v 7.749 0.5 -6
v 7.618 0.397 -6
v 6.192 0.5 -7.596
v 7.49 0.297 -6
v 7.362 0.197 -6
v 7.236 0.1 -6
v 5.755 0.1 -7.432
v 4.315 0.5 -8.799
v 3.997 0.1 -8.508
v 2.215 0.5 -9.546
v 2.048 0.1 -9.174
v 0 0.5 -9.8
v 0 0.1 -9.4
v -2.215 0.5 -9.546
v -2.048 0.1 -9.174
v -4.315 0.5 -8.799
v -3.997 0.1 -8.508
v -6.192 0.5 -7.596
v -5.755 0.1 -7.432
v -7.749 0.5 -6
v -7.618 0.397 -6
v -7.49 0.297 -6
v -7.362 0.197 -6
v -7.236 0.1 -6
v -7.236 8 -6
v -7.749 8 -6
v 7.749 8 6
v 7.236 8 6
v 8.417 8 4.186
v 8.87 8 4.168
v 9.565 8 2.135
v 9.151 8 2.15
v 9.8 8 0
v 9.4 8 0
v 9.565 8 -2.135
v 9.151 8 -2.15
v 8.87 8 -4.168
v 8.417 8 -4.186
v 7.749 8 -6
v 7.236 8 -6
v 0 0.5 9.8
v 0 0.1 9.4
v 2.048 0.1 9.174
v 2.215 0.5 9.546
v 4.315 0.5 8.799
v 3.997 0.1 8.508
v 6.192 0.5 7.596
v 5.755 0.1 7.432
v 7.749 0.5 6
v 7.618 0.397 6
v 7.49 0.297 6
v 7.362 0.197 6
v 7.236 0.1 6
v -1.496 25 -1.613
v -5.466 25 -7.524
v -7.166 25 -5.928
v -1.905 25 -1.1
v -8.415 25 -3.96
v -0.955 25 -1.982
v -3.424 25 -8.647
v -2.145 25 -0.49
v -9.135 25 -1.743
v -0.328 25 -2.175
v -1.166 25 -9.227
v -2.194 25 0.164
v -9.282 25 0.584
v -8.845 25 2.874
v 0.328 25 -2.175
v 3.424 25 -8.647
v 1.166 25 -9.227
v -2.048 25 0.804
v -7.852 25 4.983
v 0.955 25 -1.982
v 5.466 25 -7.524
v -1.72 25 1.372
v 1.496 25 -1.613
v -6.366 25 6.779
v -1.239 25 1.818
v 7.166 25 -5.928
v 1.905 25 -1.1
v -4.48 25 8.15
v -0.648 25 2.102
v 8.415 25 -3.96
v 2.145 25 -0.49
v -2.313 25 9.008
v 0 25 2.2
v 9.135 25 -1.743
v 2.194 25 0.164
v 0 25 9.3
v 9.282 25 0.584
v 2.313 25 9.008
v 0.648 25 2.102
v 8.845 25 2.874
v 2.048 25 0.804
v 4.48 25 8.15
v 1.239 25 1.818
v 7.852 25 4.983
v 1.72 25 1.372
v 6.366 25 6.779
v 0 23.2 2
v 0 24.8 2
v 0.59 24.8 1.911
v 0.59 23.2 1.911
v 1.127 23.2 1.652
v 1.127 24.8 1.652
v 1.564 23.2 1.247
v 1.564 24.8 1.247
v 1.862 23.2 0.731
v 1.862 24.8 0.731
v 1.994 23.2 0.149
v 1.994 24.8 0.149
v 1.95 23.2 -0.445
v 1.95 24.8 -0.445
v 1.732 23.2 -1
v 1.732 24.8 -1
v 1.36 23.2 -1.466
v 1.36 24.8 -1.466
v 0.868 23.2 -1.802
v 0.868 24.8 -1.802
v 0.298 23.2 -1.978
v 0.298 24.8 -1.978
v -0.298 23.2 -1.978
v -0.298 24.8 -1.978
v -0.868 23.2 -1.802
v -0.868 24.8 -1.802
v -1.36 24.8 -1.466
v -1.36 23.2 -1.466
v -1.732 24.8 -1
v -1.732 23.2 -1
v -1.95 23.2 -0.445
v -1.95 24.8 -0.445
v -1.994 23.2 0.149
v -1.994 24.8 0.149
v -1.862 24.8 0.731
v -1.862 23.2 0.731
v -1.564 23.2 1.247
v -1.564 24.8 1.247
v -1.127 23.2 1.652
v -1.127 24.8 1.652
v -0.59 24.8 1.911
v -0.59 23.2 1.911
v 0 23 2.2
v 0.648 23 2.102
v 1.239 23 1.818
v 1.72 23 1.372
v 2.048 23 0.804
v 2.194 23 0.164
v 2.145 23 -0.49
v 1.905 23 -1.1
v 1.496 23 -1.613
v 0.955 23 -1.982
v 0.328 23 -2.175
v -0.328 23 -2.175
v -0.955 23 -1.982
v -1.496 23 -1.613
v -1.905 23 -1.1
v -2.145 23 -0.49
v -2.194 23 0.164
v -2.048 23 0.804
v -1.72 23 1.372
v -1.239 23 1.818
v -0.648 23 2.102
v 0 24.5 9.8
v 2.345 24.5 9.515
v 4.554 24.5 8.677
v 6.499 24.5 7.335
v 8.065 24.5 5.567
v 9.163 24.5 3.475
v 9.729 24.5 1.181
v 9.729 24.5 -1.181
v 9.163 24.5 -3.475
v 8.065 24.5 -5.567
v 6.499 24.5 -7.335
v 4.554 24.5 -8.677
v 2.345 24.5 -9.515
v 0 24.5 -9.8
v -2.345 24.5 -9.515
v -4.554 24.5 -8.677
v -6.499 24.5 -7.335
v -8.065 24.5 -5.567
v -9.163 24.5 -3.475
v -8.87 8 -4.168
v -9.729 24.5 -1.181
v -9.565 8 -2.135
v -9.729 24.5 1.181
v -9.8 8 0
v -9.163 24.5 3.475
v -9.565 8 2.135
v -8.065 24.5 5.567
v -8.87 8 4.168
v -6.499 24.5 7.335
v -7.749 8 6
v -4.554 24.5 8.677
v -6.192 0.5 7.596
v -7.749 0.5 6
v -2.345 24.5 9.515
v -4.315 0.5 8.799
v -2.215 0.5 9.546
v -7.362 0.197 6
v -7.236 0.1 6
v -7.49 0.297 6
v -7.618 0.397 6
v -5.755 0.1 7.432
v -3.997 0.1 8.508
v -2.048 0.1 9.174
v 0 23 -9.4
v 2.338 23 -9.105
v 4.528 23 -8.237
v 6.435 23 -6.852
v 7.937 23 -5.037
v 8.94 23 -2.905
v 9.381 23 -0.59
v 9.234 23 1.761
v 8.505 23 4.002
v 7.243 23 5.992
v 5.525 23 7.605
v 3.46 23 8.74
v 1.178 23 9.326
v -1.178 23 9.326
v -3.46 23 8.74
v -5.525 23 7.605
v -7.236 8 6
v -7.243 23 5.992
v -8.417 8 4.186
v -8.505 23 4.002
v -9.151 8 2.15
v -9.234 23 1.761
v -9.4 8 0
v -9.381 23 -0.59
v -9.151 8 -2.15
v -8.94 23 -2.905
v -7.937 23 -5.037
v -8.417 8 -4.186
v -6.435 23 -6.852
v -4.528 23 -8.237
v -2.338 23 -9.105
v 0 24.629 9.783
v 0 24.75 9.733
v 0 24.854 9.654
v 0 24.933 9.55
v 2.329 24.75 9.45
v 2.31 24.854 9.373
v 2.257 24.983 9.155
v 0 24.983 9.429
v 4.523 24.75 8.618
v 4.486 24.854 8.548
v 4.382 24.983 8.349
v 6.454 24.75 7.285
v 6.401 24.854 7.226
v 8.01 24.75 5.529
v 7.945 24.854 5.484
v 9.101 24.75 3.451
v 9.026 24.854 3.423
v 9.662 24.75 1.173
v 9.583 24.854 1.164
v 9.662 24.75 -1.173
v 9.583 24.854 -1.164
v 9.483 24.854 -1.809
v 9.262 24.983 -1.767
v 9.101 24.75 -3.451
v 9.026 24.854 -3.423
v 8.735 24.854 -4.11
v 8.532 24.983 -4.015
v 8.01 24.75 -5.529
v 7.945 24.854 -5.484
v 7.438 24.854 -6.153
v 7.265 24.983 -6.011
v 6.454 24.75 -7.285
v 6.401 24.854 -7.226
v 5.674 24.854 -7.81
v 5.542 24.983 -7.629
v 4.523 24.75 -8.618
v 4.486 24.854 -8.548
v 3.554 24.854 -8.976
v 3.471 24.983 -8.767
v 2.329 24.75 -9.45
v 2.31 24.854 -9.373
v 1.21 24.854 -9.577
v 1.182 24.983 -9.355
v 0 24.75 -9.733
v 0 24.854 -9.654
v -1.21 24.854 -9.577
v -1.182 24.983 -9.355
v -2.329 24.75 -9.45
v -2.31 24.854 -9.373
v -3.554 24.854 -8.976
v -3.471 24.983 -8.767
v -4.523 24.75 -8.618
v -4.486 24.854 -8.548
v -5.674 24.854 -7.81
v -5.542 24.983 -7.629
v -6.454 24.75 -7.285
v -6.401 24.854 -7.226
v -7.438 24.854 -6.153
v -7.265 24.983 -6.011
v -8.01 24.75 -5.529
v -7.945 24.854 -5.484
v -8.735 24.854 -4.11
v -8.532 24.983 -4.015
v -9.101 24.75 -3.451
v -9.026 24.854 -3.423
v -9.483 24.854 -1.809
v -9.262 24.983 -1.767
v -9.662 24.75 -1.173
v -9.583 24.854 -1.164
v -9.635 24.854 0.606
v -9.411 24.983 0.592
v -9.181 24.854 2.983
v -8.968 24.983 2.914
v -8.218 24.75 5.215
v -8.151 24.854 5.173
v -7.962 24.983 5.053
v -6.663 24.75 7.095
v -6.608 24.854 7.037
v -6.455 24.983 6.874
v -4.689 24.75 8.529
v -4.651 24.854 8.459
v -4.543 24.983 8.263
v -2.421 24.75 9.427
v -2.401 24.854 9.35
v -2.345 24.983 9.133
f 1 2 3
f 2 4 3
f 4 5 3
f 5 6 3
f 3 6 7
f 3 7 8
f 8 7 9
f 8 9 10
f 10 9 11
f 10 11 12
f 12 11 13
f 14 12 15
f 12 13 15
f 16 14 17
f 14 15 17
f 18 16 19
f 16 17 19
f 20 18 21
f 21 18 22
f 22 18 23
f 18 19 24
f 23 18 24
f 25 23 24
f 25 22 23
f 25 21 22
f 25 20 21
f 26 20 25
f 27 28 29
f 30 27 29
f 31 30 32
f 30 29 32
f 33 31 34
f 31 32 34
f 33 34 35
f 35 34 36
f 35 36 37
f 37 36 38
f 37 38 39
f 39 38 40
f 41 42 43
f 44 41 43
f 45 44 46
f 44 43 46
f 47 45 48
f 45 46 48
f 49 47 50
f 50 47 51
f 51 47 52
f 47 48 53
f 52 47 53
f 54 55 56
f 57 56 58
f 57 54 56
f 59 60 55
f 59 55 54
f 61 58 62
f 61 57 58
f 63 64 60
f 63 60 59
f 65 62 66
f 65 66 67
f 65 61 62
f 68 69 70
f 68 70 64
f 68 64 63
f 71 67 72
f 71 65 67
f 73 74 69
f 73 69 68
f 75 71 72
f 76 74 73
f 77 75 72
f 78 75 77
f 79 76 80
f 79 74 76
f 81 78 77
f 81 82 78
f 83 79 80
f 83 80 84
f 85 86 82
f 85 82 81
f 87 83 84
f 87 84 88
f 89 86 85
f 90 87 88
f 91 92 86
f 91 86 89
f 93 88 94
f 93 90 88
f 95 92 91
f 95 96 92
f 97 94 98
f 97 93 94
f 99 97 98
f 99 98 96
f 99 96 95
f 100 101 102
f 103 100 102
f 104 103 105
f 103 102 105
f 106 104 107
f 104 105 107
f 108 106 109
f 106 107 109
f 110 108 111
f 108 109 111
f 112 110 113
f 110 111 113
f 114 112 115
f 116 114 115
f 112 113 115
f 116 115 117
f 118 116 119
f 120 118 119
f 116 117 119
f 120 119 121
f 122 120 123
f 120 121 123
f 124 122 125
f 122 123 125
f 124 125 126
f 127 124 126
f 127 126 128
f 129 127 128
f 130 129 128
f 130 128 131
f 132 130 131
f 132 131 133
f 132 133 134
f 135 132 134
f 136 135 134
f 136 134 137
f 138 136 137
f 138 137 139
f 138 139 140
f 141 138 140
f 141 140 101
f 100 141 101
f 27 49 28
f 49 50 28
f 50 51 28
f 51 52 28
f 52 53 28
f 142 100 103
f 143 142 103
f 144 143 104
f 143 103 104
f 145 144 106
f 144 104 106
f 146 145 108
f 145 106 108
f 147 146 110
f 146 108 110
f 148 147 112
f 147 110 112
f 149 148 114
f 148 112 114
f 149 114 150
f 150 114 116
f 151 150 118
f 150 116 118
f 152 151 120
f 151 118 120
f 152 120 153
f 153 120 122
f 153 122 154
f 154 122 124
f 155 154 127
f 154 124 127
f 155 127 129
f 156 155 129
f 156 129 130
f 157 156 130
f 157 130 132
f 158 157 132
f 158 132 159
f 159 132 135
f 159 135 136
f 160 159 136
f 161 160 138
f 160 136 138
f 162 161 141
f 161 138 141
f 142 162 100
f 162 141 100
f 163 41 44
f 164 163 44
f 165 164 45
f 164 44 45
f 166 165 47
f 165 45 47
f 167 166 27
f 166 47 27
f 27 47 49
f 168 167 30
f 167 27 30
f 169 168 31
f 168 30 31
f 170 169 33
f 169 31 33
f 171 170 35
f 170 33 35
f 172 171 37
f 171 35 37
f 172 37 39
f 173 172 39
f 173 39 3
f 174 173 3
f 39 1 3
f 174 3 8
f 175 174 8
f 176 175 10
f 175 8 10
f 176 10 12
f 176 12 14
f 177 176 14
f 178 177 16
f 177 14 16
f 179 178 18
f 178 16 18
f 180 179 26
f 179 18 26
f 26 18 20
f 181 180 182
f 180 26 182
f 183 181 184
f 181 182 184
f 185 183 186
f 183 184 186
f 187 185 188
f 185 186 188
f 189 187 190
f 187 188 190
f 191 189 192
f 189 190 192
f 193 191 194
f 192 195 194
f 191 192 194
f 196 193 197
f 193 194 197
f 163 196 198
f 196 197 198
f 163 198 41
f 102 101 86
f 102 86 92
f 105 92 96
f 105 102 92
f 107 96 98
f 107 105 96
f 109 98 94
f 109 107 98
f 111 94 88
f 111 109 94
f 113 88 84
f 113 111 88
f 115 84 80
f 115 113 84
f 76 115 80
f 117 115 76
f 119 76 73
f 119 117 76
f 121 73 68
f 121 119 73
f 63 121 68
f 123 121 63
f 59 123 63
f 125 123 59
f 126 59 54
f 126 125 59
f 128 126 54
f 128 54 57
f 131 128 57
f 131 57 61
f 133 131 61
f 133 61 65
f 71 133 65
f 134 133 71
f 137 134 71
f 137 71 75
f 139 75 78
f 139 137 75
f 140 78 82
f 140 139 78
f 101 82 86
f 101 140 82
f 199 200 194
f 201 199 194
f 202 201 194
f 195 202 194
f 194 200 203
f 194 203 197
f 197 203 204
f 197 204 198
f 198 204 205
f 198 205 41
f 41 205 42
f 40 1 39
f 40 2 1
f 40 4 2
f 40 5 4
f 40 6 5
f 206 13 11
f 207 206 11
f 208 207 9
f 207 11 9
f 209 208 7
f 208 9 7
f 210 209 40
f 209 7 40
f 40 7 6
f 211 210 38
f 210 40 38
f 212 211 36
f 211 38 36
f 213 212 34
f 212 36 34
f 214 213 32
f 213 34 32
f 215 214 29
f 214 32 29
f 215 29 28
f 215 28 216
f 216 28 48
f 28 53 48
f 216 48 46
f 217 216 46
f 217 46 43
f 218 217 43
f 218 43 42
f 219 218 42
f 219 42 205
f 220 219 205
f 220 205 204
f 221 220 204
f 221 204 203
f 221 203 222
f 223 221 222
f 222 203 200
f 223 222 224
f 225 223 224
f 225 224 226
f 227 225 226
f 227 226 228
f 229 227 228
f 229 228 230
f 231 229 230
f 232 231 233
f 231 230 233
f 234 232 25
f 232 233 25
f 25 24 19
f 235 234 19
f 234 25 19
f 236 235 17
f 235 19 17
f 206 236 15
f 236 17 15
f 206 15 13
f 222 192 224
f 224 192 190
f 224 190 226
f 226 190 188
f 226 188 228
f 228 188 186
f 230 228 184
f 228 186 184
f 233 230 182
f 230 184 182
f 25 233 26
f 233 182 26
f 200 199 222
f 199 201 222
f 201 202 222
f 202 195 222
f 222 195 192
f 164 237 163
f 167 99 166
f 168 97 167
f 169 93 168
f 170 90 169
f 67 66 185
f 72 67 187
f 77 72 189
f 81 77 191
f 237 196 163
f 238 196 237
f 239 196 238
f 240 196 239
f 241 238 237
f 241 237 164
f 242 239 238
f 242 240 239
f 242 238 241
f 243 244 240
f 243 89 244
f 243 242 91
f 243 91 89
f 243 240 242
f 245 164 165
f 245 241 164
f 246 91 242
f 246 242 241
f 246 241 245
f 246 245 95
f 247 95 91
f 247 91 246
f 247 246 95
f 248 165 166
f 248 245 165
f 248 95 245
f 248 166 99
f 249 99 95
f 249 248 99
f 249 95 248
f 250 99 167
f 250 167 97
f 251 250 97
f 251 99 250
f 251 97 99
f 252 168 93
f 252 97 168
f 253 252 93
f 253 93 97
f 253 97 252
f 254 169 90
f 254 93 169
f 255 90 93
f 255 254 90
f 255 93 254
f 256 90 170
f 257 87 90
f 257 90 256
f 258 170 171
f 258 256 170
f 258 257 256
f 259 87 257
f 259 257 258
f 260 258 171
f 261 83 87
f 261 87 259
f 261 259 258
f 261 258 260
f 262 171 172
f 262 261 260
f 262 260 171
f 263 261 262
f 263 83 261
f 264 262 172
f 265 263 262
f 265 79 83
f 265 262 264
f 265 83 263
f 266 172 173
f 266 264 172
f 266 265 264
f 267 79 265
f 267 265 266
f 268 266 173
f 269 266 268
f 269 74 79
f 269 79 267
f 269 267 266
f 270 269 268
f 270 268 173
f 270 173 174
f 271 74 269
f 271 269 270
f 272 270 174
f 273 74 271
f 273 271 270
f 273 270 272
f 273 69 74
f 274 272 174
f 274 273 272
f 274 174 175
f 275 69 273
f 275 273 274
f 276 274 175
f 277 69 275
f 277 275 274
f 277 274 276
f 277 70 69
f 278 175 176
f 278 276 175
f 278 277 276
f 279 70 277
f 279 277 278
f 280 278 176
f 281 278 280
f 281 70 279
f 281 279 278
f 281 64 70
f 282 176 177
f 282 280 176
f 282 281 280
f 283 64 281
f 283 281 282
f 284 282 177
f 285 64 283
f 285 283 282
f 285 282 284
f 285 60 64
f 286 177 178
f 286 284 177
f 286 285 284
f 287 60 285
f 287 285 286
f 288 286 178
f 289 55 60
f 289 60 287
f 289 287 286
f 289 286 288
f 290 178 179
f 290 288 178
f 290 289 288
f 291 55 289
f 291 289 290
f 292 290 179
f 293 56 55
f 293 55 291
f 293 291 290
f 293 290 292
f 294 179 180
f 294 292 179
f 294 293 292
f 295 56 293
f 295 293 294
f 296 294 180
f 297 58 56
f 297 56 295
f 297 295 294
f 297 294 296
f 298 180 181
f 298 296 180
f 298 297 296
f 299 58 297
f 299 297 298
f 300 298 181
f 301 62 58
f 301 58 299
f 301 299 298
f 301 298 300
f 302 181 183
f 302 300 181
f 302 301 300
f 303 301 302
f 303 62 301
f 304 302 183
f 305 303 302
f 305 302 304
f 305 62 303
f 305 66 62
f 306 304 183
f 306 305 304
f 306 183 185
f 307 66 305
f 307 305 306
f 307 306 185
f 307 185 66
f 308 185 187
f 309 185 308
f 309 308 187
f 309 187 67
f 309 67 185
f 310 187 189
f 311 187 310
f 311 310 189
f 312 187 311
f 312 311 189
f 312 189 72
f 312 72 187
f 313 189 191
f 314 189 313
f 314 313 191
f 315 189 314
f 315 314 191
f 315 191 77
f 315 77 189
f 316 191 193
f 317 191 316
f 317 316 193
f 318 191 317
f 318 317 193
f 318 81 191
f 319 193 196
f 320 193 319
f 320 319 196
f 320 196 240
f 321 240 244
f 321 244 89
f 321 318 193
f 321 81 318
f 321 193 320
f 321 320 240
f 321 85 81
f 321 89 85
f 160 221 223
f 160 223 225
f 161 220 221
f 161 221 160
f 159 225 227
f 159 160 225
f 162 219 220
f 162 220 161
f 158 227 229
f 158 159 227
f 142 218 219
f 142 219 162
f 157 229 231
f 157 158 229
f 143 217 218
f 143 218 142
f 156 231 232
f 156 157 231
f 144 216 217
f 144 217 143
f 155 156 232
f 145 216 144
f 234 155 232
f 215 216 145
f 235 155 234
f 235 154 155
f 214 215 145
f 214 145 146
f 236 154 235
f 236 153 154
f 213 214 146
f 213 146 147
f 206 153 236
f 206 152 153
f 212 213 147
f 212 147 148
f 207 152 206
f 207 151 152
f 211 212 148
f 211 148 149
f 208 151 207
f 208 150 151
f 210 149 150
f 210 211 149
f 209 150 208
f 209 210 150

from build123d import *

# Parameters (mm, degrees)
SKETCH_1_R               = 9.8
EXTRUDE_1_DEPTH          = 25
FILLET_1_R               = 0.5
SKETCH_5_R               = 9.4
CUT_EXTRUDE_2_DEPTH      = 23
CUT_EXTRUDE_3_DEPTH      = 29.584611279
CUT_EXTRUDE_3_DEPTH_BACK = 29.584611279
SKETCH_6_W               = 12
SKETCH_6_H               = 16
CHAMFER_4_SIZE           = 0.5
SKETCH_9_R               = 2
CUT_EXTRUDE_4_DEPTH      = 29.497192879
CHAMFER_5_SIZE           = 0.2


with BuildPart() as part:
    # 草图1 → 凸台-拉伸1 (new body)
    with BuildSketch(Plane(origin=(0, 0, 0), x_dir=(1, 0, 0), z_dir=(0, 1, 0))):
        with Locations(Location((0, 0, 0), (0, 0, 270))):
            Circle(SKETCH_1_R)
    extrude(amount=EXTRUDE_1_DEPTH)

    # 圆角1
    fillet_1_edges = [part.edges().sort_by_distance(p)[0] for p in [
        (0, 25, -9.8),
    ]]
    fillet(fillet_1_edges, radius=FILLET_1_R)

    # 草图5 → 切除-拉伸2 (cut)
    with BuildSketch(Plane.XZ):
        with Locations(Location((0, 0, 0), (0, 0, 270))):
            Circle(SKETCH_5_R)
    extrude(amount=-CUT_EXTRUDE_2_DEPTH, mode=Mode.SUBTRACT)

    # 草图6 → 切除-拉伸3 (cut, two sides: drawn at the far end of the back side and taken through both)
    with BuildSketch(Plane(origin=(0, 0, 0), x_dir=(0, 0, -1), z_dir=(1, 0, 0)).offset(-CUT_EXTRUDE_3_DEPTH_BACK)):
        Rectangle(SKETCH_6_W, SKETCH_6_H)
    extrude(amount=CUT_EXTRUDE_3_DEPTH + CUT_EXTRUDE_3_DEPTH_BACK, mode=Mode.SUBTRACT)

    # 倒角4
    # the kernel refuses this chamfer: 0.5 mm, written as the material it takes off along each edge
    with BuildSketch(Plane(origin=(0, 0, 0), x_dir=(0, 0, 1), z_dir=(-1, 0, 0))) as chamfer_4_piece_1:
        Polygon((9.8, CHAMFER_4_SIZE), (9.8 - CHAMFER_4_SIZE, 0), (9.8, 0), align=None)
    revolve(axis=Axis((0, 0, 0), (0, 1, 0)), revolution_arc=59.766699, mode=Mode.SUBTRACT)
    with BuildSketch(Plane(origin=(0, 0, 0), x_dir=(0.8640091314658966, 0, -0.5034761372136191), z_dir=(0.5034761372136191, 0, 0.8640091314658966))) as chamfer_4_piece_2:
        Polygon((9.8, CHAMFER_4_SIZE), (9.8 - CHAMFER_4_SIZE, 0), (9.8, 0), align=None)
    revolve(axis=Axis((0, 0, 0), (0, 1, 0)), revolution_arc=119.539505786, mode=Mode.SUBTRACT)
    with BuildSketch(Plane(origin=(0, 0, 0), x_dir=(-0.8639822947128161, 0, 0.503522188610171), z_dir=(-0.503522188610171, 0, -0.8639822947128161))) as chamfer_4_piece_3:
        Polygon((9.8, CHAMFER_4_SIZE), (9.8 - CHAMFER_4_SIZE, 0), (9.8, 0), align=None)
    revolve(axis=Axis((0, 0, 0), (0, 1, 0)), revolution_arc=59.766699, mode=Mode.SUBTRACT)

    # 草图9 → 切除-拉伸4 (cut, through all)
    with BuildSketch(Plane(origin=(0, 25, 0), x_dir=(1, 0, 0), z_dir=(0, 1, 0))):
        with Locations(Location((0, 0, 0), (0, 0, 270))):
            Circle(SKETCH_9_R)
    extrude(amount=-CUT_EXTRUDE_4_DEPTH, mode=Mode.SUBTRACT)

    # 倒角5
    chamfer_5_edges = [part.edges().sort_by_distance(p)[0] for p in [
        (0, 23, -2),
        (0, 25, -2),
    ]]
    chamfer(chamfer_5_edges, length=CHAMFER_5_SIZE)


solid = part.part
